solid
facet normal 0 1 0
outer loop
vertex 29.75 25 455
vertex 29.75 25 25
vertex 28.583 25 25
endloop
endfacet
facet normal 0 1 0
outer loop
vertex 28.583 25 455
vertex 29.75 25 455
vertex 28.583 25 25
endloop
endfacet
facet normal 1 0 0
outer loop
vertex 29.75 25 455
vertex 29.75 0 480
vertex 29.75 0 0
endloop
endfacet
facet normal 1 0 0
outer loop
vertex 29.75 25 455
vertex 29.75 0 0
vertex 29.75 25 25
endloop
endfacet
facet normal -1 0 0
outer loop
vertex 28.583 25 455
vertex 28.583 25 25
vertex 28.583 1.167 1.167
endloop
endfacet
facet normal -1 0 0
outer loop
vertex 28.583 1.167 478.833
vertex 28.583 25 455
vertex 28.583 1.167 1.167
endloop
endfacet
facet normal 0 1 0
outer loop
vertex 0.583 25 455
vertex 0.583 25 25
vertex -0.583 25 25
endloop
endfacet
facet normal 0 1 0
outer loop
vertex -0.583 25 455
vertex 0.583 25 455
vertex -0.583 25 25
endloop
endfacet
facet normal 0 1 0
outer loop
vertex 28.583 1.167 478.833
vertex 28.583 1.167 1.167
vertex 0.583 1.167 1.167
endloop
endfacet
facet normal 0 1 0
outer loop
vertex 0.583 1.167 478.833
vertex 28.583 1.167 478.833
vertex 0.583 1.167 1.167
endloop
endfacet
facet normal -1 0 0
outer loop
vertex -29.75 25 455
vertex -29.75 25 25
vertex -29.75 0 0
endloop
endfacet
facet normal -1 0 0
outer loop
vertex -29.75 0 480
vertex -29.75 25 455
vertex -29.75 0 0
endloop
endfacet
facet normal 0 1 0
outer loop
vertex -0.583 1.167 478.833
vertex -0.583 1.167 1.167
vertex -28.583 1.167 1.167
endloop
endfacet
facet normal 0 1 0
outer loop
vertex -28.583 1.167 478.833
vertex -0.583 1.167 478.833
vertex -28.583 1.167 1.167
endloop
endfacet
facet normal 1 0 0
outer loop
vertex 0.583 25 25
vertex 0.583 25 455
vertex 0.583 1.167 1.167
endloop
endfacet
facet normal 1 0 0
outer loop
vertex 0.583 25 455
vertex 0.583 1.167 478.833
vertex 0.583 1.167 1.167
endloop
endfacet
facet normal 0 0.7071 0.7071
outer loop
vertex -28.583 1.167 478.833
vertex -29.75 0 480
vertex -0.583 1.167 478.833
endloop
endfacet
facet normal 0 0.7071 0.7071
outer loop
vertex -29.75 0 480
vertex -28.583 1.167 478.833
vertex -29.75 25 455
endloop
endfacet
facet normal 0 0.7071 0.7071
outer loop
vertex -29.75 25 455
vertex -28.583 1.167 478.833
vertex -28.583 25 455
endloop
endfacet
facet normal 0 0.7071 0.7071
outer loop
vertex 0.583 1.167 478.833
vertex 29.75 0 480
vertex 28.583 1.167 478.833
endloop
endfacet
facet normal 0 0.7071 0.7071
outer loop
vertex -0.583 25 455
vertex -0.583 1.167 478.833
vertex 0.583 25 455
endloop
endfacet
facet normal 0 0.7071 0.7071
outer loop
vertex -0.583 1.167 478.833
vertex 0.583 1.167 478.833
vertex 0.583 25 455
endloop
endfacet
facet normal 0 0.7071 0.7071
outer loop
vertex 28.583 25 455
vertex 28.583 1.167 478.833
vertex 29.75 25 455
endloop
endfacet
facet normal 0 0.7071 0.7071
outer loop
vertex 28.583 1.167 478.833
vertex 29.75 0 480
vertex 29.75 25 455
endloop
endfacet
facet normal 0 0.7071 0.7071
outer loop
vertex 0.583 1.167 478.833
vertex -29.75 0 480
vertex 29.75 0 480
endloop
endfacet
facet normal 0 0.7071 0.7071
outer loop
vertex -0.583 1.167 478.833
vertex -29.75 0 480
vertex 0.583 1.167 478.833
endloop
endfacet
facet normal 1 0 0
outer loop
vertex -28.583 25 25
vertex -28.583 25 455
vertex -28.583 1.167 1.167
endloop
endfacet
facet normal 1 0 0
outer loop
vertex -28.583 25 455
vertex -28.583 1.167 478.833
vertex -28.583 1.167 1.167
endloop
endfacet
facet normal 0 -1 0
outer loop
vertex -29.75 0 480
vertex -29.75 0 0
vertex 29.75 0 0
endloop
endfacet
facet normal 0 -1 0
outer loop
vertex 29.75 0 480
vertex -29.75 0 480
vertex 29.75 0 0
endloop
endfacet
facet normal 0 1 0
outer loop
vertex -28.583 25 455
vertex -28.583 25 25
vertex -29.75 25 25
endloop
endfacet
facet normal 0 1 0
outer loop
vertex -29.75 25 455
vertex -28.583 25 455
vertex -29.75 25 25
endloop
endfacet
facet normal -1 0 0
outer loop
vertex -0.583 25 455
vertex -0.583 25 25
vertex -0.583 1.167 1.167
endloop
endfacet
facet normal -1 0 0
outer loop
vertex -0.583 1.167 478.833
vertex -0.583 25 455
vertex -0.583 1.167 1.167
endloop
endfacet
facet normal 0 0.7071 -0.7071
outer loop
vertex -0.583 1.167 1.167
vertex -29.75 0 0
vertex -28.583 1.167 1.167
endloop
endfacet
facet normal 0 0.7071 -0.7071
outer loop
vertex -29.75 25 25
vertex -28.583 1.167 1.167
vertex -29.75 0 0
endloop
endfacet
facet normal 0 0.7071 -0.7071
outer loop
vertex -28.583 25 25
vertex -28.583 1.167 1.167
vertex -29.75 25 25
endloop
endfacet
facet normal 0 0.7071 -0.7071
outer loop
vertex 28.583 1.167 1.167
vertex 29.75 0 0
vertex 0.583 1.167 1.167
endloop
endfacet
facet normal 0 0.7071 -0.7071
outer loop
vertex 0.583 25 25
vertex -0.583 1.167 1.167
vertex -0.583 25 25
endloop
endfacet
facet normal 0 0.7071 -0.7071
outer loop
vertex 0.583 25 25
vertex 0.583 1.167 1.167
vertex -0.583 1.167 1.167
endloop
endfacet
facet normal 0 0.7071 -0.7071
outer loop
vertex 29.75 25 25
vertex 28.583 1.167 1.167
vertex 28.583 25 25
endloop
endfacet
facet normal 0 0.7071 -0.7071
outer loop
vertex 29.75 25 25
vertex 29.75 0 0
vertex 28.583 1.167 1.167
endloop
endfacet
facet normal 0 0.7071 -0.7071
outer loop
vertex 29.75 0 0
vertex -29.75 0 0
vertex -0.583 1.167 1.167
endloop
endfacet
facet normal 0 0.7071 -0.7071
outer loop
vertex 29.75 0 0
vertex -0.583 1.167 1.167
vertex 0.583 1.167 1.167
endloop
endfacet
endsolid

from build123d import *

# Parameters (mm, degrees)
PAD_DEPTH       = 480
POCKET_DEPTH    = 59.501
POCKET001_DEPTH = 59.501


with BuildPart() as part:
    # Sketch → Pad (new body)
    with BuildSketch(Plane.XY):
        Polygon((-29.75, 25), (-29.75, 0), (29.75, 0), (29.75, 25), (28.583333, 25), (28.583333, 1.166667), (0.583333, 1.166667), (0.583333, 25), (-0.583333, 25), (-0.583333, 1.166667), (-28.583333, 1.166667), (-28.583333, 25), align=None)
    extrude(amount=PAD_DEPTH)

    # Sketch001 (on Face3 of Pad) → Pocket (cut, through all)
    with BuildSketch(Plane.YZ.offset(29.75)):
        Polygon((0, 0), (25, 25), (25, 0), align=None)
    extrude(amount=-POCKET_DEPTH, mode=Mode.SUBTRACT)

    # Sketch002 (on Face6 of Pocket) → Pocket001 (cut, through all)
    with BuildSketch(Plane.YZ.offset(29.75)):
        Polygon((0, 480), (25, 455), (25, 480), align=None)
    extrude(amount=-POCKET001_DEPTH, mode=Mode.SUBTRACT)


solid = part.part
